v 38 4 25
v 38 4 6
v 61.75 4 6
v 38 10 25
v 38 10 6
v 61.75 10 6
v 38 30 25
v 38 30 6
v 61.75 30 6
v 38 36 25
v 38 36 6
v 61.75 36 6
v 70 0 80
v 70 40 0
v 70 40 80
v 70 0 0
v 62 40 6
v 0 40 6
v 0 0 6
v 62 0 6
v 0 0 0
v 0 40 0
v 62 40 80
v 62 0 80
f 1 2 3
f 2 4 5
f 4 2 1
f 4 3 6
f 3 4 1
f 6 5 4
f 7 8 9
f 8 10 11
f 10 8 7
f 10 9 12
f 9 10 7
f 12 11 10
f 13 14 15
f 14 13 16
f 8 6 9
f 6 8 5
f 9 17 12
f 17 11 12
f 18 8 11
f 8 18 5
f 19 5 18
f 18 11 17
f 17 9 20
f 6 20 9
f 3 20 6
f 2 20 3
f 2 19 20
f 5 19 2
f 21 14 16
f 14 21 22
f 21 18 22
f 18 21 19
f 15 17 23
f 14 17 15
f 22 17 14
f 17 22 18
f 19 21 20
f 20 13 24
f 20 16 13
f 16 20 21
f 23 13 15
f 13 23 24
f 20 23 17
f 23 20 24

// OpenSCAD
$fn = 32;

// ----------------------------------------------------------------------
// Rib bracket: 2-gusset L bracket
// ----------------------------------------------------------------------

// --- parameters (mm) ---
base_l = 70;              // foot length, X
base_w = 40;              // foot width, Y
base_t = 6;               // foot thickness
plate_t = 8;              // upright plate thickness
plate_h = 80;             // overall height
gus_l = 24;               // gusset leg along the foot
gus_h = 20;               // gusset height
gus_t = 6;                // gusset thickness
gus_edge = 4;             // gusset margin from the foot edge
n_gus = 2;                // gusset count

gus_pitch = (base_w - 2 * gus_edge - gus_t) / (n_gus - 1);  // gusset pitch

union() {
  cube([base_l, base_w, base_t]);
  translate([base_l - plate_t, 0, base_t - 1])
    cube([plate_t, base_w, plate_h - base_t + 1]);
  for (i = [0 : n_gus - 1])
    translate([base_l - plate_t - gus_l, gus_edge + i * gus_pitch, base_t - 1])
      rotate([-90, 0, 0])
        linear_extrude(height = gus_t)
          polygon(points = [[0, 0], [gus_l + 1, 0], [0, -gus_h]]);
}
